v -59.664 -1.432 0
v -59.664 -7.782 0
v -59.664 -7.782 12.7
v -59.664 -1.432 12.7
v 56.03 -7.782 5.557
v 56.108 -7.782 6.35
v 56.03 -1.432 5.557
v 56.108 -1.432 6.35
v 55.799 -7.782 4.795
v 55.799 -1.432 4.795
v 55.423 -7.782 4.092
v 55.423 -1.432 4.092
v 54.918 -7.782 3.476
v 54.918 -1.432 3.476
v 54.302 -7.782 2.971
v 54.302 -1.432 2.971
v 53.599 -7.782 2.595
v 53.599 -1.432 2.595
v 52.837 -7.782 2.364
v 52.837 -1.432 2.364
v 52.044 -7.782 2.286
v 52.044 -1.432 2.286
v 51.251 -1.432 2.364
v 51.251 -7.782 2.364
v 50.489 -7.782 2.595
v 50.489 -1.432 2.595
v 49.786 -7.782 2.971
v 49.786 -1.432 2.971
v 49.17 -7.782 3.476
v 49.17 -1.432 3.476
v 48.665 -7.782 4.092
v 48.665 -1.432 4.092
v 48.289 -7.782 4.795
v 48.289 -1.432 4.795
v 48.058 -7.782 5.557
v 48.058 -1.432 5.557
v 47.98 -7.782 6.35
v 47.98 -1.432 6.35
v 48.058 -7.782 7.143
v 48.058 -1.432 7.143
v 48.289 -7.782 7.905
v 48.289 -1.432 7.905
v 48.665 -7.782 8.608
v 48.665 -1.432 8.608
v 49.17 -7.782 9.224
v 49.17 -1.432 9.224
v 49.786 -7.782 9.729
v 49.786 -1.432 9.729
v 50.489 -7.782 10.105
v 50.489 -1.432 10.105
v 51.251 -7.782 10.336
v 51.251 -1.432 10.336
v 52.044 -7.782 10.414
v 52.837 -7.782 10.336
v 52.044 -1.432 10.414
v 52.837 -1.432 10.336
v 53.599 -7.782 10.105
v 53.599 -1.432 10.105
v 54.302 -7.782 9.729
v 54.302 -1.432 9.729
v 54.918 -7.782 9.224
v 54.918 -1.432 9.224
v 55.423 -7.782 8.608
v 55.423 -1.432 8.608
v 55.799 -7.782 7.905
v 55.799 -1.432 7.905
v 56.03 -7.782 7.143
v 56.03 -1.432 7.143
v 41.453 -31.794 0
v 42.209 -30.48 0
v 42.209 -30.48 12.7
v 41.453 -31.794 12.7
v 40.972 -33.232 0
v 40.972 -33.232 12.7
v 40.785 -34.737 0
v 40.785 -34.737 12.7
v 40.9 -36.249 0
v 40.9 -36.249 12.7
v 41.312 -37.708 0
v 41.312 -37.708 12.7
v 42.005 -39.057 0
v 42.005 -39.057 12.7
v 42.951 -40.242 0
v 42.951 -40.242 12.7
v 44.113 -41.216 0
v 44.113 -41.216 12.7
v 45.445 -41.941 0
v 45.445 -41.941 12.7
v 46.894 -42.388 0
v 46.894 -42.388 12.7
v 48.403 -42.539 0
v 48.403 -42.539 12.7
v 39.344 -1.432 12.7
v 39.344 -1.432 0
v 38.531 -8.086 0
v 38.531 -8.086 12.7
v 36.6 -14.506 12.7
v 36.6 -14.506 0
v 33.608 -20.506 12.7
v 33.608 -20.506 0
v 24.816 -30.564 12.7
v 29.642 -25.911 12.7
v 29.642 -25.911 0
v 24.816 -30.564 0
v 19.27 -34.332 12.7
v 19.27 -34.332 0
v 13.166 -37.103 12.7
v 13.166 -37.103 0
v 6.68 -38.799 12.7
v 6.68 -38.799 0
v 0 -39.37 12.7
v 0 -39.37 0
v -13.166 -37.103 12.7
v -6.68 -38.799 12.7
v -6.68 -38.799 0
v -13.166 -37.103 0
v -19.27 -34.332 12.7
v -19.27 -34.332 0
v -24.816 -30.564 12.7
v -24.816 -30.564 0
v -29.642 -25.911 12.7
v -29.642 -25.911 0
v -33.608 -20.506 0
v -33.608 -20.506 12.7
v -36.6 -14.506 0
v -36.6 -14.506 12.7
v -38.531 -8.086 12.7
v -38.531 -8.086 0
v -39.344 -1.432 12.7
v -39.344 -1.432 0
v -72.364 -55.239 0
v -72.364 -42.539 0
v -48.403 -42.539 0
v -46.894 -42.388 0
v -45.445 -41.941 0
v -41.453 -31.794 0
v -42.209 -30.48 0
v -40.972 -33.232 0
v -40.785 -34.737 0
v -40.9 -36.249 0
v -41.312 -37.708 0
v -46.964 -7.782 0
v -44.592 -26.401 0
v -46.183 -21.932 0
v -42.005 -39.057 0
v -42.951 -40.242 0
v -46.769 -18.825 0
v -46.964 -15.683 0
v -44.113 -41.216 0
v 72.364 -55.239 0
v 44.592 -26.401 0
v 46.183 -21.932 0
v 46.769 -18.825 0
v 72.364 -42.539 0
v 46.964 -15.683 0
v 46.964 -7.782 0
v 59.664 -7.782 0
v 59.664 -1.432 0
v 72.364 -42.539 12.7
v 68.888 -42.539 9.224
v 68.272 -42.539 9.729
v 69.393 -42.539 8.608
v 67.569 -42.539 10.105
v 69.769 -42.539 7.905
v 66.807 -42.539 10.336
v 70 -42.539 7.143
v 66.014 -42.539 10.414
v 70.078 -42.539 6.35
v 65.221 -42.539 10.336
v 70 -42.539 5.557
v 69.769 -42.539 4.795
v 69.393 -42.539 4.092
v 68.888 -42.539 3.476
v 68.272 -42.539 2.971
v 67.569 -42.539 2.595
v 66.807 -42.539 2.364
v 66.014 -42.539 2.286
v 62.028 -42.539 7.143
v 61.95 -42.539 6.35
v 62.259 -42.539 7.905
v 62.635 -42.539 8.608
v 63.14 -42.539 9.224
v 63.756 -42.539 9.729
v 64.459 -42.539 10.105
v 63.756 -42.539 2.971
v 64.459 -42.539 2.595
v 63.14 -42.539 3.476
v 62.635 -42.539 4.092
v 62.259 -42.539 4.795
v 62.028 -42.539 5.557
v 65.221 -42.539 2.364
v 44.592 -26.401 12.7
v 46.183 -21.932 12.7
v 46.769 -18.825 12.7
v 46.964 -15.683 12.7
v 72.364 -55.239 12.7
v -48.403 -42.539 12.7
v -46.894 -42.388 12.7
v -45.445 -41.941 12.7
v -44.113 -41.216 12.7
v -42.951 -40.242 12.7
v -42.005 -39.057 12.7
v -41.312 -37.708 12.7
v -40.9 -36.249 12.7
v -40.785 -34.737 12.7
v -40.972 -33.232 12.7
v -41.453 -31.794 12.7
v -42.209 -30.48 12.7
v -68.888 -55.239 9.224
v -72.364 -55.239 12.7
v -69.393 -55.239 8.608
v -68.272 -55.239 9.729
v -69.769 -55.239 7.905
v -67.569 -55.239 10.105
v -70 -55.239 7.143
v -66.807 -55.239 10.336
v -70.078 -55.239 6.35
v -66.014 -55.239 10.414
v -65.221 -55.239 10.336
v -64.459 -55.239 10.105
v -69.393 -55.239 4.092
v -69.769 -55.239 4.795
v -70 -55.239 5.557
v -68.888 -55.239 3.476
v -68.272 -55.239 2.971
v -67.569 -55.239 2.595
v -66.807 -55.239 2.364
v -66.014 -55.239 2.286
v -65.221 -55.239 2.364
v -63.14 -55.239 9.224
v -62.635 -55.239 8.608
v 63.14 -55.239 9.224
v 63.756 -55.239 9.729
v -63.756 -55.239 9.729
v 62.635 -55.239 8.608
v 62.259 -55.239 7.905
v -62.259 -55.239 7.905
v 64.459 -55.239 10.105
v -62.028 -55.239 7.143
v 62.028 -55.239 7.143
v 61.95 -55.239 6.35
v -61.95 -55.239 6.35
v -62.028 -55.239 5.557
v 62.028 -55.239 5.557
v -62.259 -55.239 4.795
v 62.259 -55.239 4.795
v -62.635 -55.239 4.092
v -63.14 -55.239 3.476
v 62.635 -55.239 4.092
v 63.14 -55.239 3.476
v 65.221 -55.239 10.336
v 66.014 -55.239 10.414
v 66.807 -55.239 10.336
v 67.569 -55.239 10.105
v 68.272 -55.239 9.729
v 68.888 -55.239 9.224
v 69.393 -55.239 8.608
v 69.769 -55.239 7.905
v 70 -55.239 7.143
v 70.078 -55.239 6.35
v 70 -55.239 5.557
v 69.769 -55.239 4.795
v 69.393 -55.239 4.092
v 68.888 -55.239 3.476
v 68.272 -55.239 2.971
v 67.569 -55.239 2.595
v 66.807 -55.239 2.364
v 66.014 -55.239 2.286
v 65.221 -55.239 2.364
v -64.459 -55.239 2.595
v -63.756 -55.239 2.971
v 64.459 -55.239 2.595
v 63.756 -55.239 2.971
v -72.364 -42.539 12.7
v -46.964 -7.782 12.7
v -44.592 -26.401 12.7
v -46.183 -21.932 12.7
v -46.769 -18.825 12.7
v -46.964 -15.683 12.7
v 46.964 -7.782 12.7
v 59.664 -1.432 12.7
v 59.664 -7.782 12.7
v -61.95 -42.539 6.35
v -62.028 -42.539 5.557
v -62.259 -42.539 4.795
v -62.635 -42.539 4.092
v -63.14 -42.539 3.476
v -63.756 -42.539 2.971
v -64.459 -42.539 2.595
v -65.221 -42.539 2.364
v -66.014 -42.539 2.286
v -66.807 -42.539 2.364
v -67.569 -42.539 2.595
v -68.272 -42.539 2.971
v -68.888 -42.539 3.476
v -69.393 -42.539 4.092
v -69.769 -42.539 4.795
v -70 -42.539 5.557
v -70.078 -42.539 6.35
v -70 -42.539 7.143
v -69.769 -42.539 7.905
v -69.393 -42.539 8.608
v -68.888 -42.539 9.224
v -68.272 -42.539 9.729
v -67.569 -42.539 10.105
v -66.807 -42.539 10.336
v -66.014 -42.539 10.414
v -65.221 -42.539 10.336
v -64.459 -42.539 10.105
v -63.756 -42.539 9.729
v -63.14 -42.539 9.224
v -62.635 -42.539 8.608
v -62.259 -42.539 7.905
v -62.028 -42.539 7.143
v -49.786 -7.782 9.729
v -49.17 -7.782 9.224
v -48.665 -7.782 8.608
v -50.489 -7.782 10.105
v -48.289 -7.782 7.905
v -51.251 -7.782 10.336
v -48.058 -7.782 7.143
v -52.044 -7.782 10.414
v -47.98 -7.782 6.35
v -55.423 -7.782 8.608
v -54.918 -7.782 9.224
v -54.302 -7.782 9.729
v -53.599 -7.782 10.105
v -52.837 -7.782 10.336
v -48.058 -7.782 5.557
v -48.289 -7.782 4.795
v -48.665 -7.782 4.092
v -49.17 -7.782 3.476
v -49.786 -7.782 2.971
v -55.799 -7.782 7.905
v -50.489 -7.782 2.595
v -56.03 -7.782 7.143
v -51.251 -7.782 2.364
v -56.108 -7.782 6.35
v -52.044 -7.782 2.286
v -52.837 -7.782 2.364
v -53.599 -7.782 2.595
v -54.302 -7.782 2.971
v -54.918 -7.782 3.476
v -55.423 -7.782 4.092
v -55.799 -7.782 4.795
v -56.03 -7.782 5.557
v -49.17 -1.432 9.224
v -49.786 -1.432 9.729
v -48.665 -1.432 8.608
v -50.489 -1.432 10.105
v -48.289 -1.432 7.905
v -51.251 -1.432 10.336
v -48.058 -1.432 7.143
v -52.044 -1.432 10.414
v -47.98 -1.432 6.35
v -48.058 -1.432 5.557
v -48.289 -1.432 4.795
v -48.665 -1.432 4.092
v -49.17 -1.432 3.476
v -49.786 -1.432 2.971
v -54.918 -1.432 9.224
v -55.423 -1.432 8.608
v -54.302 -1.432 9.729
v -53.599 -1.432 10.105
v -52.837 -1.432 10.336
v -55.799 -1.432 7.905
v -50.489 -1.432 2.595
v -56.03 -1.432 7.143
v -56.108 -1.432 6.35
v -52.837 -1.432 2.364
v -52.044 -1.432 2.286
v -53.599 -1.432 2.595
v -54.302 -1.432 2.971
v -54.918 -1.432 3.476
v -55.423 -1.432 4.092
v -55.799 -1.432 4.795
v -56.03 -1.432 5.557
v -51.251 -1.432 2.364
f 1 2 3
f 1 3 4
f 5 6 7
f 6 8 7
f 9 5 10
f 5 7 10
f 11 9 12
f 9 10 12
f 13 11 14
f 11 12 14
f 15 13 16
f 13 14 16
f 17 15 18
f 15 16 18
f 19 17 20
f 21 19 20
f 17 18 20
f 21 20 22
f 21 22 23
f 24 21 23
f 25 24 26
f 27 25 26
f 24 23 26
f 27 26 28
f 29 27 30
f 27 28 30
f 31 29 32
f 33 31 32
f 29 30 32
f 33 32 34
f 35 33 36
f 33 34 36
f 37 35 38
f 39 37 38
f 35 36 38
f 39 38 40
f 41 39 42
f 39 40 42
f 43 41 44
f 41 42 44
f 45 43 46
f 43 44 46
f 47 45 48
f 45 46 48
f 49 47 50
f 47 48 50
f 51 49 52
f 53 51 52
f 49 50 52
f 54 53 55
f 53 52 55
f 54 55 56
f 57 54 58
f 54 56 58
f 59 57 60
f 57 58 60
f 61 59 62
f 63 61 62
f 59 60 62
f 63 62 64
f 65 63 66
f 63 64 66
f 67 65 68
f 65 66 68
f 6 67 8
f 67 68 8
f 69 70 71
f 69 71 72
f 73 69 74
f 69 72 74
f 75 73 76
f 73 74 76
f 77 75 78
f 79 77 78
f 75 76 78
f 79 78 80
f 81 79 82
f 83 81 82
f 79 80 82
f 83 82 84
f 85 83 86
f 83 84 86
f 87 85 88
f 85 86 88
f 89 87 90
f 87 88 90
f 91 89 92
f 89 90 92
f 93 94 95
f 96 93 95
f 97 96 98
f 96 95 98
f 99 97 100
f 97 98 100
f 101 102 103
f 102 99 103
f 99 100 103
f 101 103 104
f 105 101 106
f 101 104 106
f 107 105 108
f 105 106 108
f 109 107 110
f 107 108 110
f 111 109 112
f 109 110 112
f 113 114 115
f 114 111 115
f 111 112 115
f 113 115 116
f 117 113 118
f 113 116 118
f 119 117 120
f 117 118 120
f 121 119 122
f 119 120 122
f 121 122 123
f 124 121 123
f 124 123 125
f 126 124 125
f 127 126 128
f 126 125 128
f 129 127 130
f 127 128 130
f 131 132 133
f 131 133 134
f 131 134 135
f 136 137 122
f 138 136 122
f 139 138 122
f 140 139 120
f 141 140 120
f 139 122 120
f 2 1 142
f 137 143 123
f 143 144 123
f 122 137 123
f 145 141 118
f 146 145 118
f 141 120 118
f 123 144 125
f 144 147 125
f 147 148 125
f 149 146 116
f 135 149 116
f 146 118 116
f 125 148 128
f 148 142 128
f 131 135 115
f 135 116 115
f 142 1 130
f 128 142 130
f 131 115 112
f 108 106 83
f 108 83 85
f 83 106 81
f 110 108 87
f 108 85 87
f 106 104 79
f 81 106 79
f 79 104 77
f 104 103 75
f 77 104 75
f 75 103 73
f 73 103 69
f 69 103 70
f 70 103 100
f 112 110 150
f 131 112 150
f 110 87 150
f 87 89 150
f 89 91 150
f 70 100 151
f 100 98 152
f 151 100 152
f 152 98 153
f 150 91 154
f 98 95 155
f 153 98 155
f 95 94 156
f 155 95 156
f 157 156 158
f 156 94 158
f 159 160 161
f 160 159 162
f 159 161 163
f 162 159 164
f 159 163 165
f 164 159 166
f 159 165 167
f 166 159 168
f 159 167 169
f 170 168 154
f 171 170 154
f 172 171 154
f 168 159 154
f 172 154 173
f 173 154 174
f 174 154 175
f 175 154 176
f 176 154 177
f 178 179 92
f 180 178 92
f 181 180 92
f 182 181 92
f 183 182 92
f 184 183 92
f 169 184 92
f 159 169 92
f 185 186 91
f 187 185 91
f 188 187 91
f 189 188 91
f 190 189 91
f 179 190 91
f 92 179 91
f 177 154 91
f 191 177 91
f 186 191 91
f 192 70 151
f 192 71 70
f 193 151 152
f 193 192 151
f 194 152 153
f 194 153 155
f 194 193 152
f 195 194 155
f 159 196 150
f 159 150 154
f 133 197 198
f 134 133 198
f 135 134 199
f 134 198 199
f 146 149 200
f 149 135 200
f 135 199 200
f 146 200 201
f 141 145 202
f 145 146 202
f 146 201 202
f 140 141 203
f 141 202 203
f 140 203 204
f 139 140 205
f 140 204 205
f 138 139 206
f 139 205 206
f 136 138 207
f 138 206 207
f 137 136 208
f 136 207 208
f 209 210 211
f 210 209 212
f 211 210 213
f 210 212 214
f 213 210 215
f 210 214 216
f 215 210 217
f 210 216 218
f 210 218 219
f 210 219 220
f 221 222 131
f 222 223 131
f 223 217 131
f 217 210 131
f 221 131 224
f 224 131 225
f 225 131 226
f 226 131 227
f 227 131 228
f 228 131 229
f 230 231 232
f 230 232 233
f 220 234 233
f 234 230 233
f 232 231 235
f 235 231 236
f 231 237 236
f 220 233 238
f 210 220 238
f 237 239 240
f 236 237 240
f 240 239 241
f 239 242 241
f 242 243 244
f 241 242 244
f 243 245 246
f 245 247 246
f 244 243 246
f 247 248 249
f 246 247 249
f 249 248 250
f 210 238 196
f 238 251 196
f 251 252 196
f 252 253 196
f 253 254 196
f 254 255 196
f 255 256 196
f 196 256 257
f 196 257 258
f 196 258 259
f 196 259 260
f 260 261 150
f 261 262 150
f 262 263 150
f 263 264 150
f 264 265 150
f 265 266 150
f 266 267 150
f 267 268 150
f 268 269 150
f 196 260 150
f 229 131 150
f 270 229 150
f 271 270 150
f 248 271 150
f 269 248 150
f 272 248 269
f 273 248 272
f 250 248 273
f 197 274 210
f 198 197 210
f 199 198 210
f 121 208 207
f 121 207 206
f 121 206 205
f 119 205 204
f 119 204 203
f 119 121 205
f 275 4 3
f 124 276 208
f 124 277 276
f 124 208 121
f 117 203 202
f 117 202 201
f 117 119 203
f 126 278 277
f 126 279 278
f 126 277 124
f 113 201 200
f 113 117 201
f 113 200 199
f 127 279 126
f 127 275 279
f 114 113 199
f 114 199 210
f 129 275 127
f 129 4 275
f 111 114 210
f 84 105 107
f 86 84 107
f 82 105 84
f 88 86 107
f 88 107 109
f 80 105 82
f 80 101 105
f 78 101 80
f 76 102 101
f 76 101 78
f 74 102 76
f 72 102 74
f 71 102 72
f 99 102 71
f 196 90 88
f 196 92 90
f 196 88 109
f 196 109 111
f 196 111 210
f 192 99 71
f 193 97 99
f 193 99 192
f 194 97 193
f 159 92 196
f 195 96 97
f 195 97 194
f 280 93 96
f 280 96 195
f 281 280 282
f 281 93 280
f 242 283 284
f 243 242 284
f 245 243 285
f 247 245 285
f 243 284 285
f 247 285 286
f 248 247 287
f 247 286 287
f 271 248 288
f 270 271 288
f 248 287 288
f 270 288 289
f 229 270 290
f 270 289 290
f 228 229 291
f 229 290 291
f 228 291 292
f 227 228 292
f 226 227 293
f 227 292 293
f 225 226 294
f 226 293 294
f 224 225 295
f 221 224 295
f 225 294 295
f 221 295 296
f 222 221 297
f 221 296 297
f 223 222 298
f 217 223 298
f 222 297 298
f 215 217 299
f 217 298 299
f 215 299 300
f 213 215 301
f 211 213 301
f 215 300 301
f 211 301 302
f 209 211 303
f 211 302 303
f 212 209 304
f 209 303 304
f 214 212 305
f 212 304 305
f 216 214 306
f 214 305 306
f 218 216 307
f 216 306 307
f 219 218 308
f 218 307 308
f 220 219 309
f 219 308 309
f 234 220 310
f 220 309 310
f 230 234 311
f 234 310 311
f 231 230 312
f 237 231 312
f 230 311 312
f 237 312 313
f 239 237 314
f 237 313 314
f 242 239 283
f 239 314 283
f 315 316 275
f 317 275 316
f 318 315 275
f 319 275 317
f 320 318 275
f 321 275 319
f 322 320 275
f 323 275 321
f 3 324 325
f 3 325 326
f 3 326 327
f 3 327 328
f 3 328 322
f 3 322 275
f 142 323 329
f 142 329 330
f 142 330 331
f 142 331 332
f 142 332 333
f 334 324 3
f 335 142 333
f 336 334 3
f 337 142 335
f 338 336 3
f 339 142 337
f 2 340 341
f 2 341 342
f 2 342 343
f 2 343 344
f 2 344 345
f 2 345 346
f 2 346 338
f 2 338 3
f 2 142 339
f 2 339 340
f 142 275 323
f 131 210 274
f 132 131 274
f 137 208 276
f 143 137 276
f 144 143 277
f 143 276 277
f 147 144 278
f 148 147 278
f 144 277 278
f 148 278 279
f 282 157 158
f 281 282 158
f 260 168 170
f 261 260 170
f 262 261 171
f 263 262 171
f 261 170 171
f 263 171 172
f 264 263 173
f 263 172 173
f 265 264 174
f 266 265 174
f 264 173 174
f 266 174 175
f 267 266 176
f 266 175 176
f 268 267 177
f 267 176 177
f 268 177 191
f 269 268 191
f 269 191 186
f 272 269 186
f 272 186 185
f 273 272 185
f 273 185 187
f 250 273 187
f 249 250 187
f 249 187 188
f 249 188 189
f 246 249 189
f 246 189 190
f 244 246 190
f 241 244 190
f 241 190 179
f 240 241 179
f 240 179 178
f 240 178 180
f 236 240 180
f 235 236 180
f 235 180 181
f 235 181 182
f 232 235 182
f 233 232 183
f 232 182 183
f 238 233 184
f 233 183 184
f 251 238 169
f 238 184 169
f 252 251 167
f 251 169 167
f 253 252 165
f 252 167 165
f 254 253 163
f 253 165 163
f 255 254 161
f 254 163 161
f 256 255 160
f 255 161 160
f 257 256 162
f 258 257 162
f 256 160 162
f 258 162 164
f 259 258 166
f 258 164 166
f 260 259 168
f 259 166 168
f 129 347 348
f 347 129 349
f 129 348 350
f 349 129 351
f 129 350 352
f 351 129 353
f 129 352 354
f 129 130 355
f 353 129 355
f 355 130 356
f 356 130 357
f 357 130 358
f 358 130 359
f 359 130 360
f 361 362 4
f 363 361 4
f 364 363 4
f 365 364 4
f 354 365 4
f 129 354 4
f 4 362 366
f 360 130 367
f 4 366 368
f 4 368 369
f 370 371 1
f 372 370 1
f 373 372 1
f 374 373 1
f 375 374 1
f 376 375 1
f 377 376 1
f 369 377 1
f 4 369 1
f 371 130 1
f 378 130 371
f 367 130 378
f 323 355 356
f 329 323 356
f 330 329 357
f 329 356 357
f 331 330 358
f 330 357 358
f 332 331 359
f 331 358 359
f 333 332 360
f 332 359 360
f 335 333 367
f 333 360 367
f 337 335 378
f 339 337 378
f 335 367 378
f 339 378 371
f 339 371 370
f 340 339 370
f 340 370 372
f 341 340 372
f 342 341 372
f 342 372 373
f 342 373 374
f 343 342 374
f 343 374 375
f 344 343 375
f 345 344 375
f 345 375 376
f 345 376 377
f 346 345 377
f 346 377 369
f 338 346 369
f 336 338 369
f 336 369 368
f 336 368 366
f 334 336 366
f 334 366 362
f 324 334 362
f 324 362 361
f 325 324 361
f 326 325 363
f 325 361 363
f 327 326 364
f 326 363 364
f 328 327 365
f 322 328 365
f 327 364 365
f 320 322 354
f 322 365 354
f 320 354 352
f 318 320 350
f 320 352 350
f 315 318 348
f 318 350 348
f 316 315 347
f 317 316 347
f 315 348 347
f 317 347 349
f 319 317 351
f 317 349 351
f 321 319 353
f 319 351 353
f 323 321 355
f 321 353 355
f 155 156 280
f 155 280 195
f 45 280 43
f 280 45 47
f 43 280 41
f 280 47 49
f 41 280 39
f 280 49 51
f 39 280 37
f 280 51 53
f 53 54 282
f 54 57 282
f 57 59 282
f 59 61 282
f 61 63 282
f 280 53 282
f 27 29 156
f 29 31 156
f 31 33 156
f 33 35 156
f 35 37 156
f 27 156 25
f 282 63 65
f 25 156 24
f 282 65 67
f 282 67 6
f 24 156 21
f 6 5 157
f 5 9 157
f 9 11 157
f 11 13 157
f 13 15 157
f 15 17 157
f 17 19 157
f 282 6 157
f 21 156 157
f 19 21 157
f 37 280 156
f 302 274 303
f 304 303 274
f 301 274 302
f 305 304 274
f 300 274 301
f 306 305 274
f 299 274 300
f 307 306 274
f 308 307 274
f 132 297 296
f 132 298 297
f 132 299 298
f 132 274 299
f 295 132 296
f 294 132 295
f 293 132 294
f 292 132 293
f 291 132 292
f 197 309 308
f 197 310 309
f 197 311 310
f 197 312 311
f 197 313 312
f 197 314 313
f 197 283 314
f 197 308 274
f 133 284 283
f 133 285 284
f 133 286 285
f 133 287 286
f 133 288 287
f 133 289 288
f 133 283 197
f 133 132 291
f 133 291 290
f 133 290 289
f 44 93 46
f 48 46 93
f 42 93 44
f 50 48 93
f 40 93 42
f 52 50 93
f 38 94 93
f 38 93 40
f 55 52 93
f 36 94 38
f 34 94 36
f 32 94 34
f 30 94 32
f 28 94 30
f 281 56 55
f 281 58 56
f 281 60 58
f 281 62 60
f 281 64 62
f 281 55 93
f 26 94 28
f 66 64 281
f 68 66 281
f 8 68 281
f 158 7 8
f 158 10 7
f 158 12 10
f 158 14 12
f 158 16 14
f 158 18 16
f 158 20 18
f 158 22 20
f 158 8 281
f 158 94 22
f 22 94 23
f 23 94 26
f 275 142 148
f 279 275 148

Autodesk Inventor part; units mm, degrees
ref_plane "YZ Plane" through (0, 0, 0) normal (1, 0, 0) x (0, 1, 0)
ref_plane "XZ Plane" through (0, 0, 0) normal (0, 1, 0) x (-1, 0, 0)
ref_plane "XY Plane" through (0, 0, 0) normal (0, 0, 1) x (1, 0, 0)
sketch "Sketch1" plane through (0, 0, 0) normal (0, 0, 1) x (1, 0, 0)
  arc A0 (-39.344, -1.4316) -> (39.344, -1.4316) centre (0, 0) ccw
  line L0 (-39.344, -1.4316) -> (-39.3671, -1.4316)
  line L1 (-39.344, -1.4316) -> (-52.044, -1.4316)
  line L2 (39.344, -1.4316) -> (52.044, -1.4316)
  arc A1 (-46.964, -22.4724) -> (46.964, -22.4724) centre (0, 0) ccw
  line L3 (0, -52.0636) -> (0, -55.2386)
  line L4 (0, -55.2386) -> (-72.364, -55.2386)
  line L5 (0, -55.2386) -> (72.364, -55.2386)
  line L6 (-52.044, -1.4316) -> (-59.664, -1.4316)
  line L7 (52.044, -1.4316) -> (59.664, -1.4316)
  line L8 (39.344, -1.4316) -> (46.964, -1.4316)
  line L9 (46.964, -1.4316) -> (46.964, -22.4724)
  line L10 (-39.344, -1.4316) -> (-45.694, -1.4316)
  line L11 (-39.344, -1.4316) -> (-46.964, -1.4316)
  line L12 (-46.964, -1.4316) -> (-46.964, -22.4724)
  line L13 (-46.964, -7.7816) -> (-59.664, -7.7816)
  line L14 (-59.664, -7.7816) -> (-59.664, -1.4316)
  line L15 (46.964, -7.7816) -> (59.664, -7.7816)
  line L16 (59.664, -7.7816) -> (59.664, -1.4316)
  line L17 (-72.364, -55.2386) -> (-72.364, -42.5386)
  line L18 (72.364, -55.2386) -> (72.364, -42.5386)
  line L19 (-72.364, -42.5386) -> (-30.0181, -42.5386)
  line L20 (72.364, -42.5386) -> (30.0181, -42.5386)
  dimension "d0" = 78.74
  dimension "d2" = 12.7
  dimension "d3" = 12.7
  dimension "d4" = 3.175
  dimension "d5" = 7.62
  dimension "d6" = 7.62
  dimension "d7" = 7.62
  dimension "d9" = 7.62
  dimension "d10" = 6.35
  dimension "d11" = 6.35
  dimension "d14" = 12.7
  dimension "d15" = 12.7
extrude "Extrusion1" add sketch "Sketch1" along normal blind 12.7
fillet "Fillet1" radius 7.62 2 edges at (30.0181, -42.5386, 6.35) (-30.0181, -42.5386, 6.35)
fillet "Fillet2" radius 25.4 2 edges at (-46.964, -22.4724, 6.35) (46.964, -22.4724, 6.35)
sketch "Sketch2" plane through (-59.664, -1.4316, 0) normal (0, 1, 0) x (1, 0, 0)
  line L0 (0, 0) -> (0, -12.7) projected
  line L1 (99.0079, 0) -> (20.32, 0) projected
  line L2 (0, 0) -> (20.32, 0)
  circle A0 centre (7.62, -6.35) radius 4.064
  circle A1 centre (111.7079, -6.35) radius 4.064
  line L3 (119.3279, 0) -> (119.3279, -12.7) projected
  line L4 (-12.7, 0) -> (132.0279, 0) projected
  line L5 (119.3279, 0) -> (132.0279, 0)
  circle A2 centre (125.6779, -6.35) radius 4.064
  line L6 (-12.7, 0) -> (0, 0)
  circle A3 centre (-6.35, -6.35) radius 4.064
  line L7 (20.32, 0) -> (20.32, -12.7) projected
  line L8 (99.0079, 0) -> (99.0079, -12.7) projected
  point P0 (59.664, 0)
  dimension "d20" = 8.128
  dimension "d21" = 8.128
  dimension "d22" = 8.128
  dimension "d23" = 8.128
  dimension "d24" = 12.7
  dimension "d25" = 12.7
extrude "Extrusion2" cut sketch "Sketch2" against normal blind 25.4 contours A0 | A1
extrude "Extrusion3" cut sketch "Sketch2" against normal blind 76.2 contours A2 | A3
properties part number "MOTOR MOUNT REAL BOTTOM"
